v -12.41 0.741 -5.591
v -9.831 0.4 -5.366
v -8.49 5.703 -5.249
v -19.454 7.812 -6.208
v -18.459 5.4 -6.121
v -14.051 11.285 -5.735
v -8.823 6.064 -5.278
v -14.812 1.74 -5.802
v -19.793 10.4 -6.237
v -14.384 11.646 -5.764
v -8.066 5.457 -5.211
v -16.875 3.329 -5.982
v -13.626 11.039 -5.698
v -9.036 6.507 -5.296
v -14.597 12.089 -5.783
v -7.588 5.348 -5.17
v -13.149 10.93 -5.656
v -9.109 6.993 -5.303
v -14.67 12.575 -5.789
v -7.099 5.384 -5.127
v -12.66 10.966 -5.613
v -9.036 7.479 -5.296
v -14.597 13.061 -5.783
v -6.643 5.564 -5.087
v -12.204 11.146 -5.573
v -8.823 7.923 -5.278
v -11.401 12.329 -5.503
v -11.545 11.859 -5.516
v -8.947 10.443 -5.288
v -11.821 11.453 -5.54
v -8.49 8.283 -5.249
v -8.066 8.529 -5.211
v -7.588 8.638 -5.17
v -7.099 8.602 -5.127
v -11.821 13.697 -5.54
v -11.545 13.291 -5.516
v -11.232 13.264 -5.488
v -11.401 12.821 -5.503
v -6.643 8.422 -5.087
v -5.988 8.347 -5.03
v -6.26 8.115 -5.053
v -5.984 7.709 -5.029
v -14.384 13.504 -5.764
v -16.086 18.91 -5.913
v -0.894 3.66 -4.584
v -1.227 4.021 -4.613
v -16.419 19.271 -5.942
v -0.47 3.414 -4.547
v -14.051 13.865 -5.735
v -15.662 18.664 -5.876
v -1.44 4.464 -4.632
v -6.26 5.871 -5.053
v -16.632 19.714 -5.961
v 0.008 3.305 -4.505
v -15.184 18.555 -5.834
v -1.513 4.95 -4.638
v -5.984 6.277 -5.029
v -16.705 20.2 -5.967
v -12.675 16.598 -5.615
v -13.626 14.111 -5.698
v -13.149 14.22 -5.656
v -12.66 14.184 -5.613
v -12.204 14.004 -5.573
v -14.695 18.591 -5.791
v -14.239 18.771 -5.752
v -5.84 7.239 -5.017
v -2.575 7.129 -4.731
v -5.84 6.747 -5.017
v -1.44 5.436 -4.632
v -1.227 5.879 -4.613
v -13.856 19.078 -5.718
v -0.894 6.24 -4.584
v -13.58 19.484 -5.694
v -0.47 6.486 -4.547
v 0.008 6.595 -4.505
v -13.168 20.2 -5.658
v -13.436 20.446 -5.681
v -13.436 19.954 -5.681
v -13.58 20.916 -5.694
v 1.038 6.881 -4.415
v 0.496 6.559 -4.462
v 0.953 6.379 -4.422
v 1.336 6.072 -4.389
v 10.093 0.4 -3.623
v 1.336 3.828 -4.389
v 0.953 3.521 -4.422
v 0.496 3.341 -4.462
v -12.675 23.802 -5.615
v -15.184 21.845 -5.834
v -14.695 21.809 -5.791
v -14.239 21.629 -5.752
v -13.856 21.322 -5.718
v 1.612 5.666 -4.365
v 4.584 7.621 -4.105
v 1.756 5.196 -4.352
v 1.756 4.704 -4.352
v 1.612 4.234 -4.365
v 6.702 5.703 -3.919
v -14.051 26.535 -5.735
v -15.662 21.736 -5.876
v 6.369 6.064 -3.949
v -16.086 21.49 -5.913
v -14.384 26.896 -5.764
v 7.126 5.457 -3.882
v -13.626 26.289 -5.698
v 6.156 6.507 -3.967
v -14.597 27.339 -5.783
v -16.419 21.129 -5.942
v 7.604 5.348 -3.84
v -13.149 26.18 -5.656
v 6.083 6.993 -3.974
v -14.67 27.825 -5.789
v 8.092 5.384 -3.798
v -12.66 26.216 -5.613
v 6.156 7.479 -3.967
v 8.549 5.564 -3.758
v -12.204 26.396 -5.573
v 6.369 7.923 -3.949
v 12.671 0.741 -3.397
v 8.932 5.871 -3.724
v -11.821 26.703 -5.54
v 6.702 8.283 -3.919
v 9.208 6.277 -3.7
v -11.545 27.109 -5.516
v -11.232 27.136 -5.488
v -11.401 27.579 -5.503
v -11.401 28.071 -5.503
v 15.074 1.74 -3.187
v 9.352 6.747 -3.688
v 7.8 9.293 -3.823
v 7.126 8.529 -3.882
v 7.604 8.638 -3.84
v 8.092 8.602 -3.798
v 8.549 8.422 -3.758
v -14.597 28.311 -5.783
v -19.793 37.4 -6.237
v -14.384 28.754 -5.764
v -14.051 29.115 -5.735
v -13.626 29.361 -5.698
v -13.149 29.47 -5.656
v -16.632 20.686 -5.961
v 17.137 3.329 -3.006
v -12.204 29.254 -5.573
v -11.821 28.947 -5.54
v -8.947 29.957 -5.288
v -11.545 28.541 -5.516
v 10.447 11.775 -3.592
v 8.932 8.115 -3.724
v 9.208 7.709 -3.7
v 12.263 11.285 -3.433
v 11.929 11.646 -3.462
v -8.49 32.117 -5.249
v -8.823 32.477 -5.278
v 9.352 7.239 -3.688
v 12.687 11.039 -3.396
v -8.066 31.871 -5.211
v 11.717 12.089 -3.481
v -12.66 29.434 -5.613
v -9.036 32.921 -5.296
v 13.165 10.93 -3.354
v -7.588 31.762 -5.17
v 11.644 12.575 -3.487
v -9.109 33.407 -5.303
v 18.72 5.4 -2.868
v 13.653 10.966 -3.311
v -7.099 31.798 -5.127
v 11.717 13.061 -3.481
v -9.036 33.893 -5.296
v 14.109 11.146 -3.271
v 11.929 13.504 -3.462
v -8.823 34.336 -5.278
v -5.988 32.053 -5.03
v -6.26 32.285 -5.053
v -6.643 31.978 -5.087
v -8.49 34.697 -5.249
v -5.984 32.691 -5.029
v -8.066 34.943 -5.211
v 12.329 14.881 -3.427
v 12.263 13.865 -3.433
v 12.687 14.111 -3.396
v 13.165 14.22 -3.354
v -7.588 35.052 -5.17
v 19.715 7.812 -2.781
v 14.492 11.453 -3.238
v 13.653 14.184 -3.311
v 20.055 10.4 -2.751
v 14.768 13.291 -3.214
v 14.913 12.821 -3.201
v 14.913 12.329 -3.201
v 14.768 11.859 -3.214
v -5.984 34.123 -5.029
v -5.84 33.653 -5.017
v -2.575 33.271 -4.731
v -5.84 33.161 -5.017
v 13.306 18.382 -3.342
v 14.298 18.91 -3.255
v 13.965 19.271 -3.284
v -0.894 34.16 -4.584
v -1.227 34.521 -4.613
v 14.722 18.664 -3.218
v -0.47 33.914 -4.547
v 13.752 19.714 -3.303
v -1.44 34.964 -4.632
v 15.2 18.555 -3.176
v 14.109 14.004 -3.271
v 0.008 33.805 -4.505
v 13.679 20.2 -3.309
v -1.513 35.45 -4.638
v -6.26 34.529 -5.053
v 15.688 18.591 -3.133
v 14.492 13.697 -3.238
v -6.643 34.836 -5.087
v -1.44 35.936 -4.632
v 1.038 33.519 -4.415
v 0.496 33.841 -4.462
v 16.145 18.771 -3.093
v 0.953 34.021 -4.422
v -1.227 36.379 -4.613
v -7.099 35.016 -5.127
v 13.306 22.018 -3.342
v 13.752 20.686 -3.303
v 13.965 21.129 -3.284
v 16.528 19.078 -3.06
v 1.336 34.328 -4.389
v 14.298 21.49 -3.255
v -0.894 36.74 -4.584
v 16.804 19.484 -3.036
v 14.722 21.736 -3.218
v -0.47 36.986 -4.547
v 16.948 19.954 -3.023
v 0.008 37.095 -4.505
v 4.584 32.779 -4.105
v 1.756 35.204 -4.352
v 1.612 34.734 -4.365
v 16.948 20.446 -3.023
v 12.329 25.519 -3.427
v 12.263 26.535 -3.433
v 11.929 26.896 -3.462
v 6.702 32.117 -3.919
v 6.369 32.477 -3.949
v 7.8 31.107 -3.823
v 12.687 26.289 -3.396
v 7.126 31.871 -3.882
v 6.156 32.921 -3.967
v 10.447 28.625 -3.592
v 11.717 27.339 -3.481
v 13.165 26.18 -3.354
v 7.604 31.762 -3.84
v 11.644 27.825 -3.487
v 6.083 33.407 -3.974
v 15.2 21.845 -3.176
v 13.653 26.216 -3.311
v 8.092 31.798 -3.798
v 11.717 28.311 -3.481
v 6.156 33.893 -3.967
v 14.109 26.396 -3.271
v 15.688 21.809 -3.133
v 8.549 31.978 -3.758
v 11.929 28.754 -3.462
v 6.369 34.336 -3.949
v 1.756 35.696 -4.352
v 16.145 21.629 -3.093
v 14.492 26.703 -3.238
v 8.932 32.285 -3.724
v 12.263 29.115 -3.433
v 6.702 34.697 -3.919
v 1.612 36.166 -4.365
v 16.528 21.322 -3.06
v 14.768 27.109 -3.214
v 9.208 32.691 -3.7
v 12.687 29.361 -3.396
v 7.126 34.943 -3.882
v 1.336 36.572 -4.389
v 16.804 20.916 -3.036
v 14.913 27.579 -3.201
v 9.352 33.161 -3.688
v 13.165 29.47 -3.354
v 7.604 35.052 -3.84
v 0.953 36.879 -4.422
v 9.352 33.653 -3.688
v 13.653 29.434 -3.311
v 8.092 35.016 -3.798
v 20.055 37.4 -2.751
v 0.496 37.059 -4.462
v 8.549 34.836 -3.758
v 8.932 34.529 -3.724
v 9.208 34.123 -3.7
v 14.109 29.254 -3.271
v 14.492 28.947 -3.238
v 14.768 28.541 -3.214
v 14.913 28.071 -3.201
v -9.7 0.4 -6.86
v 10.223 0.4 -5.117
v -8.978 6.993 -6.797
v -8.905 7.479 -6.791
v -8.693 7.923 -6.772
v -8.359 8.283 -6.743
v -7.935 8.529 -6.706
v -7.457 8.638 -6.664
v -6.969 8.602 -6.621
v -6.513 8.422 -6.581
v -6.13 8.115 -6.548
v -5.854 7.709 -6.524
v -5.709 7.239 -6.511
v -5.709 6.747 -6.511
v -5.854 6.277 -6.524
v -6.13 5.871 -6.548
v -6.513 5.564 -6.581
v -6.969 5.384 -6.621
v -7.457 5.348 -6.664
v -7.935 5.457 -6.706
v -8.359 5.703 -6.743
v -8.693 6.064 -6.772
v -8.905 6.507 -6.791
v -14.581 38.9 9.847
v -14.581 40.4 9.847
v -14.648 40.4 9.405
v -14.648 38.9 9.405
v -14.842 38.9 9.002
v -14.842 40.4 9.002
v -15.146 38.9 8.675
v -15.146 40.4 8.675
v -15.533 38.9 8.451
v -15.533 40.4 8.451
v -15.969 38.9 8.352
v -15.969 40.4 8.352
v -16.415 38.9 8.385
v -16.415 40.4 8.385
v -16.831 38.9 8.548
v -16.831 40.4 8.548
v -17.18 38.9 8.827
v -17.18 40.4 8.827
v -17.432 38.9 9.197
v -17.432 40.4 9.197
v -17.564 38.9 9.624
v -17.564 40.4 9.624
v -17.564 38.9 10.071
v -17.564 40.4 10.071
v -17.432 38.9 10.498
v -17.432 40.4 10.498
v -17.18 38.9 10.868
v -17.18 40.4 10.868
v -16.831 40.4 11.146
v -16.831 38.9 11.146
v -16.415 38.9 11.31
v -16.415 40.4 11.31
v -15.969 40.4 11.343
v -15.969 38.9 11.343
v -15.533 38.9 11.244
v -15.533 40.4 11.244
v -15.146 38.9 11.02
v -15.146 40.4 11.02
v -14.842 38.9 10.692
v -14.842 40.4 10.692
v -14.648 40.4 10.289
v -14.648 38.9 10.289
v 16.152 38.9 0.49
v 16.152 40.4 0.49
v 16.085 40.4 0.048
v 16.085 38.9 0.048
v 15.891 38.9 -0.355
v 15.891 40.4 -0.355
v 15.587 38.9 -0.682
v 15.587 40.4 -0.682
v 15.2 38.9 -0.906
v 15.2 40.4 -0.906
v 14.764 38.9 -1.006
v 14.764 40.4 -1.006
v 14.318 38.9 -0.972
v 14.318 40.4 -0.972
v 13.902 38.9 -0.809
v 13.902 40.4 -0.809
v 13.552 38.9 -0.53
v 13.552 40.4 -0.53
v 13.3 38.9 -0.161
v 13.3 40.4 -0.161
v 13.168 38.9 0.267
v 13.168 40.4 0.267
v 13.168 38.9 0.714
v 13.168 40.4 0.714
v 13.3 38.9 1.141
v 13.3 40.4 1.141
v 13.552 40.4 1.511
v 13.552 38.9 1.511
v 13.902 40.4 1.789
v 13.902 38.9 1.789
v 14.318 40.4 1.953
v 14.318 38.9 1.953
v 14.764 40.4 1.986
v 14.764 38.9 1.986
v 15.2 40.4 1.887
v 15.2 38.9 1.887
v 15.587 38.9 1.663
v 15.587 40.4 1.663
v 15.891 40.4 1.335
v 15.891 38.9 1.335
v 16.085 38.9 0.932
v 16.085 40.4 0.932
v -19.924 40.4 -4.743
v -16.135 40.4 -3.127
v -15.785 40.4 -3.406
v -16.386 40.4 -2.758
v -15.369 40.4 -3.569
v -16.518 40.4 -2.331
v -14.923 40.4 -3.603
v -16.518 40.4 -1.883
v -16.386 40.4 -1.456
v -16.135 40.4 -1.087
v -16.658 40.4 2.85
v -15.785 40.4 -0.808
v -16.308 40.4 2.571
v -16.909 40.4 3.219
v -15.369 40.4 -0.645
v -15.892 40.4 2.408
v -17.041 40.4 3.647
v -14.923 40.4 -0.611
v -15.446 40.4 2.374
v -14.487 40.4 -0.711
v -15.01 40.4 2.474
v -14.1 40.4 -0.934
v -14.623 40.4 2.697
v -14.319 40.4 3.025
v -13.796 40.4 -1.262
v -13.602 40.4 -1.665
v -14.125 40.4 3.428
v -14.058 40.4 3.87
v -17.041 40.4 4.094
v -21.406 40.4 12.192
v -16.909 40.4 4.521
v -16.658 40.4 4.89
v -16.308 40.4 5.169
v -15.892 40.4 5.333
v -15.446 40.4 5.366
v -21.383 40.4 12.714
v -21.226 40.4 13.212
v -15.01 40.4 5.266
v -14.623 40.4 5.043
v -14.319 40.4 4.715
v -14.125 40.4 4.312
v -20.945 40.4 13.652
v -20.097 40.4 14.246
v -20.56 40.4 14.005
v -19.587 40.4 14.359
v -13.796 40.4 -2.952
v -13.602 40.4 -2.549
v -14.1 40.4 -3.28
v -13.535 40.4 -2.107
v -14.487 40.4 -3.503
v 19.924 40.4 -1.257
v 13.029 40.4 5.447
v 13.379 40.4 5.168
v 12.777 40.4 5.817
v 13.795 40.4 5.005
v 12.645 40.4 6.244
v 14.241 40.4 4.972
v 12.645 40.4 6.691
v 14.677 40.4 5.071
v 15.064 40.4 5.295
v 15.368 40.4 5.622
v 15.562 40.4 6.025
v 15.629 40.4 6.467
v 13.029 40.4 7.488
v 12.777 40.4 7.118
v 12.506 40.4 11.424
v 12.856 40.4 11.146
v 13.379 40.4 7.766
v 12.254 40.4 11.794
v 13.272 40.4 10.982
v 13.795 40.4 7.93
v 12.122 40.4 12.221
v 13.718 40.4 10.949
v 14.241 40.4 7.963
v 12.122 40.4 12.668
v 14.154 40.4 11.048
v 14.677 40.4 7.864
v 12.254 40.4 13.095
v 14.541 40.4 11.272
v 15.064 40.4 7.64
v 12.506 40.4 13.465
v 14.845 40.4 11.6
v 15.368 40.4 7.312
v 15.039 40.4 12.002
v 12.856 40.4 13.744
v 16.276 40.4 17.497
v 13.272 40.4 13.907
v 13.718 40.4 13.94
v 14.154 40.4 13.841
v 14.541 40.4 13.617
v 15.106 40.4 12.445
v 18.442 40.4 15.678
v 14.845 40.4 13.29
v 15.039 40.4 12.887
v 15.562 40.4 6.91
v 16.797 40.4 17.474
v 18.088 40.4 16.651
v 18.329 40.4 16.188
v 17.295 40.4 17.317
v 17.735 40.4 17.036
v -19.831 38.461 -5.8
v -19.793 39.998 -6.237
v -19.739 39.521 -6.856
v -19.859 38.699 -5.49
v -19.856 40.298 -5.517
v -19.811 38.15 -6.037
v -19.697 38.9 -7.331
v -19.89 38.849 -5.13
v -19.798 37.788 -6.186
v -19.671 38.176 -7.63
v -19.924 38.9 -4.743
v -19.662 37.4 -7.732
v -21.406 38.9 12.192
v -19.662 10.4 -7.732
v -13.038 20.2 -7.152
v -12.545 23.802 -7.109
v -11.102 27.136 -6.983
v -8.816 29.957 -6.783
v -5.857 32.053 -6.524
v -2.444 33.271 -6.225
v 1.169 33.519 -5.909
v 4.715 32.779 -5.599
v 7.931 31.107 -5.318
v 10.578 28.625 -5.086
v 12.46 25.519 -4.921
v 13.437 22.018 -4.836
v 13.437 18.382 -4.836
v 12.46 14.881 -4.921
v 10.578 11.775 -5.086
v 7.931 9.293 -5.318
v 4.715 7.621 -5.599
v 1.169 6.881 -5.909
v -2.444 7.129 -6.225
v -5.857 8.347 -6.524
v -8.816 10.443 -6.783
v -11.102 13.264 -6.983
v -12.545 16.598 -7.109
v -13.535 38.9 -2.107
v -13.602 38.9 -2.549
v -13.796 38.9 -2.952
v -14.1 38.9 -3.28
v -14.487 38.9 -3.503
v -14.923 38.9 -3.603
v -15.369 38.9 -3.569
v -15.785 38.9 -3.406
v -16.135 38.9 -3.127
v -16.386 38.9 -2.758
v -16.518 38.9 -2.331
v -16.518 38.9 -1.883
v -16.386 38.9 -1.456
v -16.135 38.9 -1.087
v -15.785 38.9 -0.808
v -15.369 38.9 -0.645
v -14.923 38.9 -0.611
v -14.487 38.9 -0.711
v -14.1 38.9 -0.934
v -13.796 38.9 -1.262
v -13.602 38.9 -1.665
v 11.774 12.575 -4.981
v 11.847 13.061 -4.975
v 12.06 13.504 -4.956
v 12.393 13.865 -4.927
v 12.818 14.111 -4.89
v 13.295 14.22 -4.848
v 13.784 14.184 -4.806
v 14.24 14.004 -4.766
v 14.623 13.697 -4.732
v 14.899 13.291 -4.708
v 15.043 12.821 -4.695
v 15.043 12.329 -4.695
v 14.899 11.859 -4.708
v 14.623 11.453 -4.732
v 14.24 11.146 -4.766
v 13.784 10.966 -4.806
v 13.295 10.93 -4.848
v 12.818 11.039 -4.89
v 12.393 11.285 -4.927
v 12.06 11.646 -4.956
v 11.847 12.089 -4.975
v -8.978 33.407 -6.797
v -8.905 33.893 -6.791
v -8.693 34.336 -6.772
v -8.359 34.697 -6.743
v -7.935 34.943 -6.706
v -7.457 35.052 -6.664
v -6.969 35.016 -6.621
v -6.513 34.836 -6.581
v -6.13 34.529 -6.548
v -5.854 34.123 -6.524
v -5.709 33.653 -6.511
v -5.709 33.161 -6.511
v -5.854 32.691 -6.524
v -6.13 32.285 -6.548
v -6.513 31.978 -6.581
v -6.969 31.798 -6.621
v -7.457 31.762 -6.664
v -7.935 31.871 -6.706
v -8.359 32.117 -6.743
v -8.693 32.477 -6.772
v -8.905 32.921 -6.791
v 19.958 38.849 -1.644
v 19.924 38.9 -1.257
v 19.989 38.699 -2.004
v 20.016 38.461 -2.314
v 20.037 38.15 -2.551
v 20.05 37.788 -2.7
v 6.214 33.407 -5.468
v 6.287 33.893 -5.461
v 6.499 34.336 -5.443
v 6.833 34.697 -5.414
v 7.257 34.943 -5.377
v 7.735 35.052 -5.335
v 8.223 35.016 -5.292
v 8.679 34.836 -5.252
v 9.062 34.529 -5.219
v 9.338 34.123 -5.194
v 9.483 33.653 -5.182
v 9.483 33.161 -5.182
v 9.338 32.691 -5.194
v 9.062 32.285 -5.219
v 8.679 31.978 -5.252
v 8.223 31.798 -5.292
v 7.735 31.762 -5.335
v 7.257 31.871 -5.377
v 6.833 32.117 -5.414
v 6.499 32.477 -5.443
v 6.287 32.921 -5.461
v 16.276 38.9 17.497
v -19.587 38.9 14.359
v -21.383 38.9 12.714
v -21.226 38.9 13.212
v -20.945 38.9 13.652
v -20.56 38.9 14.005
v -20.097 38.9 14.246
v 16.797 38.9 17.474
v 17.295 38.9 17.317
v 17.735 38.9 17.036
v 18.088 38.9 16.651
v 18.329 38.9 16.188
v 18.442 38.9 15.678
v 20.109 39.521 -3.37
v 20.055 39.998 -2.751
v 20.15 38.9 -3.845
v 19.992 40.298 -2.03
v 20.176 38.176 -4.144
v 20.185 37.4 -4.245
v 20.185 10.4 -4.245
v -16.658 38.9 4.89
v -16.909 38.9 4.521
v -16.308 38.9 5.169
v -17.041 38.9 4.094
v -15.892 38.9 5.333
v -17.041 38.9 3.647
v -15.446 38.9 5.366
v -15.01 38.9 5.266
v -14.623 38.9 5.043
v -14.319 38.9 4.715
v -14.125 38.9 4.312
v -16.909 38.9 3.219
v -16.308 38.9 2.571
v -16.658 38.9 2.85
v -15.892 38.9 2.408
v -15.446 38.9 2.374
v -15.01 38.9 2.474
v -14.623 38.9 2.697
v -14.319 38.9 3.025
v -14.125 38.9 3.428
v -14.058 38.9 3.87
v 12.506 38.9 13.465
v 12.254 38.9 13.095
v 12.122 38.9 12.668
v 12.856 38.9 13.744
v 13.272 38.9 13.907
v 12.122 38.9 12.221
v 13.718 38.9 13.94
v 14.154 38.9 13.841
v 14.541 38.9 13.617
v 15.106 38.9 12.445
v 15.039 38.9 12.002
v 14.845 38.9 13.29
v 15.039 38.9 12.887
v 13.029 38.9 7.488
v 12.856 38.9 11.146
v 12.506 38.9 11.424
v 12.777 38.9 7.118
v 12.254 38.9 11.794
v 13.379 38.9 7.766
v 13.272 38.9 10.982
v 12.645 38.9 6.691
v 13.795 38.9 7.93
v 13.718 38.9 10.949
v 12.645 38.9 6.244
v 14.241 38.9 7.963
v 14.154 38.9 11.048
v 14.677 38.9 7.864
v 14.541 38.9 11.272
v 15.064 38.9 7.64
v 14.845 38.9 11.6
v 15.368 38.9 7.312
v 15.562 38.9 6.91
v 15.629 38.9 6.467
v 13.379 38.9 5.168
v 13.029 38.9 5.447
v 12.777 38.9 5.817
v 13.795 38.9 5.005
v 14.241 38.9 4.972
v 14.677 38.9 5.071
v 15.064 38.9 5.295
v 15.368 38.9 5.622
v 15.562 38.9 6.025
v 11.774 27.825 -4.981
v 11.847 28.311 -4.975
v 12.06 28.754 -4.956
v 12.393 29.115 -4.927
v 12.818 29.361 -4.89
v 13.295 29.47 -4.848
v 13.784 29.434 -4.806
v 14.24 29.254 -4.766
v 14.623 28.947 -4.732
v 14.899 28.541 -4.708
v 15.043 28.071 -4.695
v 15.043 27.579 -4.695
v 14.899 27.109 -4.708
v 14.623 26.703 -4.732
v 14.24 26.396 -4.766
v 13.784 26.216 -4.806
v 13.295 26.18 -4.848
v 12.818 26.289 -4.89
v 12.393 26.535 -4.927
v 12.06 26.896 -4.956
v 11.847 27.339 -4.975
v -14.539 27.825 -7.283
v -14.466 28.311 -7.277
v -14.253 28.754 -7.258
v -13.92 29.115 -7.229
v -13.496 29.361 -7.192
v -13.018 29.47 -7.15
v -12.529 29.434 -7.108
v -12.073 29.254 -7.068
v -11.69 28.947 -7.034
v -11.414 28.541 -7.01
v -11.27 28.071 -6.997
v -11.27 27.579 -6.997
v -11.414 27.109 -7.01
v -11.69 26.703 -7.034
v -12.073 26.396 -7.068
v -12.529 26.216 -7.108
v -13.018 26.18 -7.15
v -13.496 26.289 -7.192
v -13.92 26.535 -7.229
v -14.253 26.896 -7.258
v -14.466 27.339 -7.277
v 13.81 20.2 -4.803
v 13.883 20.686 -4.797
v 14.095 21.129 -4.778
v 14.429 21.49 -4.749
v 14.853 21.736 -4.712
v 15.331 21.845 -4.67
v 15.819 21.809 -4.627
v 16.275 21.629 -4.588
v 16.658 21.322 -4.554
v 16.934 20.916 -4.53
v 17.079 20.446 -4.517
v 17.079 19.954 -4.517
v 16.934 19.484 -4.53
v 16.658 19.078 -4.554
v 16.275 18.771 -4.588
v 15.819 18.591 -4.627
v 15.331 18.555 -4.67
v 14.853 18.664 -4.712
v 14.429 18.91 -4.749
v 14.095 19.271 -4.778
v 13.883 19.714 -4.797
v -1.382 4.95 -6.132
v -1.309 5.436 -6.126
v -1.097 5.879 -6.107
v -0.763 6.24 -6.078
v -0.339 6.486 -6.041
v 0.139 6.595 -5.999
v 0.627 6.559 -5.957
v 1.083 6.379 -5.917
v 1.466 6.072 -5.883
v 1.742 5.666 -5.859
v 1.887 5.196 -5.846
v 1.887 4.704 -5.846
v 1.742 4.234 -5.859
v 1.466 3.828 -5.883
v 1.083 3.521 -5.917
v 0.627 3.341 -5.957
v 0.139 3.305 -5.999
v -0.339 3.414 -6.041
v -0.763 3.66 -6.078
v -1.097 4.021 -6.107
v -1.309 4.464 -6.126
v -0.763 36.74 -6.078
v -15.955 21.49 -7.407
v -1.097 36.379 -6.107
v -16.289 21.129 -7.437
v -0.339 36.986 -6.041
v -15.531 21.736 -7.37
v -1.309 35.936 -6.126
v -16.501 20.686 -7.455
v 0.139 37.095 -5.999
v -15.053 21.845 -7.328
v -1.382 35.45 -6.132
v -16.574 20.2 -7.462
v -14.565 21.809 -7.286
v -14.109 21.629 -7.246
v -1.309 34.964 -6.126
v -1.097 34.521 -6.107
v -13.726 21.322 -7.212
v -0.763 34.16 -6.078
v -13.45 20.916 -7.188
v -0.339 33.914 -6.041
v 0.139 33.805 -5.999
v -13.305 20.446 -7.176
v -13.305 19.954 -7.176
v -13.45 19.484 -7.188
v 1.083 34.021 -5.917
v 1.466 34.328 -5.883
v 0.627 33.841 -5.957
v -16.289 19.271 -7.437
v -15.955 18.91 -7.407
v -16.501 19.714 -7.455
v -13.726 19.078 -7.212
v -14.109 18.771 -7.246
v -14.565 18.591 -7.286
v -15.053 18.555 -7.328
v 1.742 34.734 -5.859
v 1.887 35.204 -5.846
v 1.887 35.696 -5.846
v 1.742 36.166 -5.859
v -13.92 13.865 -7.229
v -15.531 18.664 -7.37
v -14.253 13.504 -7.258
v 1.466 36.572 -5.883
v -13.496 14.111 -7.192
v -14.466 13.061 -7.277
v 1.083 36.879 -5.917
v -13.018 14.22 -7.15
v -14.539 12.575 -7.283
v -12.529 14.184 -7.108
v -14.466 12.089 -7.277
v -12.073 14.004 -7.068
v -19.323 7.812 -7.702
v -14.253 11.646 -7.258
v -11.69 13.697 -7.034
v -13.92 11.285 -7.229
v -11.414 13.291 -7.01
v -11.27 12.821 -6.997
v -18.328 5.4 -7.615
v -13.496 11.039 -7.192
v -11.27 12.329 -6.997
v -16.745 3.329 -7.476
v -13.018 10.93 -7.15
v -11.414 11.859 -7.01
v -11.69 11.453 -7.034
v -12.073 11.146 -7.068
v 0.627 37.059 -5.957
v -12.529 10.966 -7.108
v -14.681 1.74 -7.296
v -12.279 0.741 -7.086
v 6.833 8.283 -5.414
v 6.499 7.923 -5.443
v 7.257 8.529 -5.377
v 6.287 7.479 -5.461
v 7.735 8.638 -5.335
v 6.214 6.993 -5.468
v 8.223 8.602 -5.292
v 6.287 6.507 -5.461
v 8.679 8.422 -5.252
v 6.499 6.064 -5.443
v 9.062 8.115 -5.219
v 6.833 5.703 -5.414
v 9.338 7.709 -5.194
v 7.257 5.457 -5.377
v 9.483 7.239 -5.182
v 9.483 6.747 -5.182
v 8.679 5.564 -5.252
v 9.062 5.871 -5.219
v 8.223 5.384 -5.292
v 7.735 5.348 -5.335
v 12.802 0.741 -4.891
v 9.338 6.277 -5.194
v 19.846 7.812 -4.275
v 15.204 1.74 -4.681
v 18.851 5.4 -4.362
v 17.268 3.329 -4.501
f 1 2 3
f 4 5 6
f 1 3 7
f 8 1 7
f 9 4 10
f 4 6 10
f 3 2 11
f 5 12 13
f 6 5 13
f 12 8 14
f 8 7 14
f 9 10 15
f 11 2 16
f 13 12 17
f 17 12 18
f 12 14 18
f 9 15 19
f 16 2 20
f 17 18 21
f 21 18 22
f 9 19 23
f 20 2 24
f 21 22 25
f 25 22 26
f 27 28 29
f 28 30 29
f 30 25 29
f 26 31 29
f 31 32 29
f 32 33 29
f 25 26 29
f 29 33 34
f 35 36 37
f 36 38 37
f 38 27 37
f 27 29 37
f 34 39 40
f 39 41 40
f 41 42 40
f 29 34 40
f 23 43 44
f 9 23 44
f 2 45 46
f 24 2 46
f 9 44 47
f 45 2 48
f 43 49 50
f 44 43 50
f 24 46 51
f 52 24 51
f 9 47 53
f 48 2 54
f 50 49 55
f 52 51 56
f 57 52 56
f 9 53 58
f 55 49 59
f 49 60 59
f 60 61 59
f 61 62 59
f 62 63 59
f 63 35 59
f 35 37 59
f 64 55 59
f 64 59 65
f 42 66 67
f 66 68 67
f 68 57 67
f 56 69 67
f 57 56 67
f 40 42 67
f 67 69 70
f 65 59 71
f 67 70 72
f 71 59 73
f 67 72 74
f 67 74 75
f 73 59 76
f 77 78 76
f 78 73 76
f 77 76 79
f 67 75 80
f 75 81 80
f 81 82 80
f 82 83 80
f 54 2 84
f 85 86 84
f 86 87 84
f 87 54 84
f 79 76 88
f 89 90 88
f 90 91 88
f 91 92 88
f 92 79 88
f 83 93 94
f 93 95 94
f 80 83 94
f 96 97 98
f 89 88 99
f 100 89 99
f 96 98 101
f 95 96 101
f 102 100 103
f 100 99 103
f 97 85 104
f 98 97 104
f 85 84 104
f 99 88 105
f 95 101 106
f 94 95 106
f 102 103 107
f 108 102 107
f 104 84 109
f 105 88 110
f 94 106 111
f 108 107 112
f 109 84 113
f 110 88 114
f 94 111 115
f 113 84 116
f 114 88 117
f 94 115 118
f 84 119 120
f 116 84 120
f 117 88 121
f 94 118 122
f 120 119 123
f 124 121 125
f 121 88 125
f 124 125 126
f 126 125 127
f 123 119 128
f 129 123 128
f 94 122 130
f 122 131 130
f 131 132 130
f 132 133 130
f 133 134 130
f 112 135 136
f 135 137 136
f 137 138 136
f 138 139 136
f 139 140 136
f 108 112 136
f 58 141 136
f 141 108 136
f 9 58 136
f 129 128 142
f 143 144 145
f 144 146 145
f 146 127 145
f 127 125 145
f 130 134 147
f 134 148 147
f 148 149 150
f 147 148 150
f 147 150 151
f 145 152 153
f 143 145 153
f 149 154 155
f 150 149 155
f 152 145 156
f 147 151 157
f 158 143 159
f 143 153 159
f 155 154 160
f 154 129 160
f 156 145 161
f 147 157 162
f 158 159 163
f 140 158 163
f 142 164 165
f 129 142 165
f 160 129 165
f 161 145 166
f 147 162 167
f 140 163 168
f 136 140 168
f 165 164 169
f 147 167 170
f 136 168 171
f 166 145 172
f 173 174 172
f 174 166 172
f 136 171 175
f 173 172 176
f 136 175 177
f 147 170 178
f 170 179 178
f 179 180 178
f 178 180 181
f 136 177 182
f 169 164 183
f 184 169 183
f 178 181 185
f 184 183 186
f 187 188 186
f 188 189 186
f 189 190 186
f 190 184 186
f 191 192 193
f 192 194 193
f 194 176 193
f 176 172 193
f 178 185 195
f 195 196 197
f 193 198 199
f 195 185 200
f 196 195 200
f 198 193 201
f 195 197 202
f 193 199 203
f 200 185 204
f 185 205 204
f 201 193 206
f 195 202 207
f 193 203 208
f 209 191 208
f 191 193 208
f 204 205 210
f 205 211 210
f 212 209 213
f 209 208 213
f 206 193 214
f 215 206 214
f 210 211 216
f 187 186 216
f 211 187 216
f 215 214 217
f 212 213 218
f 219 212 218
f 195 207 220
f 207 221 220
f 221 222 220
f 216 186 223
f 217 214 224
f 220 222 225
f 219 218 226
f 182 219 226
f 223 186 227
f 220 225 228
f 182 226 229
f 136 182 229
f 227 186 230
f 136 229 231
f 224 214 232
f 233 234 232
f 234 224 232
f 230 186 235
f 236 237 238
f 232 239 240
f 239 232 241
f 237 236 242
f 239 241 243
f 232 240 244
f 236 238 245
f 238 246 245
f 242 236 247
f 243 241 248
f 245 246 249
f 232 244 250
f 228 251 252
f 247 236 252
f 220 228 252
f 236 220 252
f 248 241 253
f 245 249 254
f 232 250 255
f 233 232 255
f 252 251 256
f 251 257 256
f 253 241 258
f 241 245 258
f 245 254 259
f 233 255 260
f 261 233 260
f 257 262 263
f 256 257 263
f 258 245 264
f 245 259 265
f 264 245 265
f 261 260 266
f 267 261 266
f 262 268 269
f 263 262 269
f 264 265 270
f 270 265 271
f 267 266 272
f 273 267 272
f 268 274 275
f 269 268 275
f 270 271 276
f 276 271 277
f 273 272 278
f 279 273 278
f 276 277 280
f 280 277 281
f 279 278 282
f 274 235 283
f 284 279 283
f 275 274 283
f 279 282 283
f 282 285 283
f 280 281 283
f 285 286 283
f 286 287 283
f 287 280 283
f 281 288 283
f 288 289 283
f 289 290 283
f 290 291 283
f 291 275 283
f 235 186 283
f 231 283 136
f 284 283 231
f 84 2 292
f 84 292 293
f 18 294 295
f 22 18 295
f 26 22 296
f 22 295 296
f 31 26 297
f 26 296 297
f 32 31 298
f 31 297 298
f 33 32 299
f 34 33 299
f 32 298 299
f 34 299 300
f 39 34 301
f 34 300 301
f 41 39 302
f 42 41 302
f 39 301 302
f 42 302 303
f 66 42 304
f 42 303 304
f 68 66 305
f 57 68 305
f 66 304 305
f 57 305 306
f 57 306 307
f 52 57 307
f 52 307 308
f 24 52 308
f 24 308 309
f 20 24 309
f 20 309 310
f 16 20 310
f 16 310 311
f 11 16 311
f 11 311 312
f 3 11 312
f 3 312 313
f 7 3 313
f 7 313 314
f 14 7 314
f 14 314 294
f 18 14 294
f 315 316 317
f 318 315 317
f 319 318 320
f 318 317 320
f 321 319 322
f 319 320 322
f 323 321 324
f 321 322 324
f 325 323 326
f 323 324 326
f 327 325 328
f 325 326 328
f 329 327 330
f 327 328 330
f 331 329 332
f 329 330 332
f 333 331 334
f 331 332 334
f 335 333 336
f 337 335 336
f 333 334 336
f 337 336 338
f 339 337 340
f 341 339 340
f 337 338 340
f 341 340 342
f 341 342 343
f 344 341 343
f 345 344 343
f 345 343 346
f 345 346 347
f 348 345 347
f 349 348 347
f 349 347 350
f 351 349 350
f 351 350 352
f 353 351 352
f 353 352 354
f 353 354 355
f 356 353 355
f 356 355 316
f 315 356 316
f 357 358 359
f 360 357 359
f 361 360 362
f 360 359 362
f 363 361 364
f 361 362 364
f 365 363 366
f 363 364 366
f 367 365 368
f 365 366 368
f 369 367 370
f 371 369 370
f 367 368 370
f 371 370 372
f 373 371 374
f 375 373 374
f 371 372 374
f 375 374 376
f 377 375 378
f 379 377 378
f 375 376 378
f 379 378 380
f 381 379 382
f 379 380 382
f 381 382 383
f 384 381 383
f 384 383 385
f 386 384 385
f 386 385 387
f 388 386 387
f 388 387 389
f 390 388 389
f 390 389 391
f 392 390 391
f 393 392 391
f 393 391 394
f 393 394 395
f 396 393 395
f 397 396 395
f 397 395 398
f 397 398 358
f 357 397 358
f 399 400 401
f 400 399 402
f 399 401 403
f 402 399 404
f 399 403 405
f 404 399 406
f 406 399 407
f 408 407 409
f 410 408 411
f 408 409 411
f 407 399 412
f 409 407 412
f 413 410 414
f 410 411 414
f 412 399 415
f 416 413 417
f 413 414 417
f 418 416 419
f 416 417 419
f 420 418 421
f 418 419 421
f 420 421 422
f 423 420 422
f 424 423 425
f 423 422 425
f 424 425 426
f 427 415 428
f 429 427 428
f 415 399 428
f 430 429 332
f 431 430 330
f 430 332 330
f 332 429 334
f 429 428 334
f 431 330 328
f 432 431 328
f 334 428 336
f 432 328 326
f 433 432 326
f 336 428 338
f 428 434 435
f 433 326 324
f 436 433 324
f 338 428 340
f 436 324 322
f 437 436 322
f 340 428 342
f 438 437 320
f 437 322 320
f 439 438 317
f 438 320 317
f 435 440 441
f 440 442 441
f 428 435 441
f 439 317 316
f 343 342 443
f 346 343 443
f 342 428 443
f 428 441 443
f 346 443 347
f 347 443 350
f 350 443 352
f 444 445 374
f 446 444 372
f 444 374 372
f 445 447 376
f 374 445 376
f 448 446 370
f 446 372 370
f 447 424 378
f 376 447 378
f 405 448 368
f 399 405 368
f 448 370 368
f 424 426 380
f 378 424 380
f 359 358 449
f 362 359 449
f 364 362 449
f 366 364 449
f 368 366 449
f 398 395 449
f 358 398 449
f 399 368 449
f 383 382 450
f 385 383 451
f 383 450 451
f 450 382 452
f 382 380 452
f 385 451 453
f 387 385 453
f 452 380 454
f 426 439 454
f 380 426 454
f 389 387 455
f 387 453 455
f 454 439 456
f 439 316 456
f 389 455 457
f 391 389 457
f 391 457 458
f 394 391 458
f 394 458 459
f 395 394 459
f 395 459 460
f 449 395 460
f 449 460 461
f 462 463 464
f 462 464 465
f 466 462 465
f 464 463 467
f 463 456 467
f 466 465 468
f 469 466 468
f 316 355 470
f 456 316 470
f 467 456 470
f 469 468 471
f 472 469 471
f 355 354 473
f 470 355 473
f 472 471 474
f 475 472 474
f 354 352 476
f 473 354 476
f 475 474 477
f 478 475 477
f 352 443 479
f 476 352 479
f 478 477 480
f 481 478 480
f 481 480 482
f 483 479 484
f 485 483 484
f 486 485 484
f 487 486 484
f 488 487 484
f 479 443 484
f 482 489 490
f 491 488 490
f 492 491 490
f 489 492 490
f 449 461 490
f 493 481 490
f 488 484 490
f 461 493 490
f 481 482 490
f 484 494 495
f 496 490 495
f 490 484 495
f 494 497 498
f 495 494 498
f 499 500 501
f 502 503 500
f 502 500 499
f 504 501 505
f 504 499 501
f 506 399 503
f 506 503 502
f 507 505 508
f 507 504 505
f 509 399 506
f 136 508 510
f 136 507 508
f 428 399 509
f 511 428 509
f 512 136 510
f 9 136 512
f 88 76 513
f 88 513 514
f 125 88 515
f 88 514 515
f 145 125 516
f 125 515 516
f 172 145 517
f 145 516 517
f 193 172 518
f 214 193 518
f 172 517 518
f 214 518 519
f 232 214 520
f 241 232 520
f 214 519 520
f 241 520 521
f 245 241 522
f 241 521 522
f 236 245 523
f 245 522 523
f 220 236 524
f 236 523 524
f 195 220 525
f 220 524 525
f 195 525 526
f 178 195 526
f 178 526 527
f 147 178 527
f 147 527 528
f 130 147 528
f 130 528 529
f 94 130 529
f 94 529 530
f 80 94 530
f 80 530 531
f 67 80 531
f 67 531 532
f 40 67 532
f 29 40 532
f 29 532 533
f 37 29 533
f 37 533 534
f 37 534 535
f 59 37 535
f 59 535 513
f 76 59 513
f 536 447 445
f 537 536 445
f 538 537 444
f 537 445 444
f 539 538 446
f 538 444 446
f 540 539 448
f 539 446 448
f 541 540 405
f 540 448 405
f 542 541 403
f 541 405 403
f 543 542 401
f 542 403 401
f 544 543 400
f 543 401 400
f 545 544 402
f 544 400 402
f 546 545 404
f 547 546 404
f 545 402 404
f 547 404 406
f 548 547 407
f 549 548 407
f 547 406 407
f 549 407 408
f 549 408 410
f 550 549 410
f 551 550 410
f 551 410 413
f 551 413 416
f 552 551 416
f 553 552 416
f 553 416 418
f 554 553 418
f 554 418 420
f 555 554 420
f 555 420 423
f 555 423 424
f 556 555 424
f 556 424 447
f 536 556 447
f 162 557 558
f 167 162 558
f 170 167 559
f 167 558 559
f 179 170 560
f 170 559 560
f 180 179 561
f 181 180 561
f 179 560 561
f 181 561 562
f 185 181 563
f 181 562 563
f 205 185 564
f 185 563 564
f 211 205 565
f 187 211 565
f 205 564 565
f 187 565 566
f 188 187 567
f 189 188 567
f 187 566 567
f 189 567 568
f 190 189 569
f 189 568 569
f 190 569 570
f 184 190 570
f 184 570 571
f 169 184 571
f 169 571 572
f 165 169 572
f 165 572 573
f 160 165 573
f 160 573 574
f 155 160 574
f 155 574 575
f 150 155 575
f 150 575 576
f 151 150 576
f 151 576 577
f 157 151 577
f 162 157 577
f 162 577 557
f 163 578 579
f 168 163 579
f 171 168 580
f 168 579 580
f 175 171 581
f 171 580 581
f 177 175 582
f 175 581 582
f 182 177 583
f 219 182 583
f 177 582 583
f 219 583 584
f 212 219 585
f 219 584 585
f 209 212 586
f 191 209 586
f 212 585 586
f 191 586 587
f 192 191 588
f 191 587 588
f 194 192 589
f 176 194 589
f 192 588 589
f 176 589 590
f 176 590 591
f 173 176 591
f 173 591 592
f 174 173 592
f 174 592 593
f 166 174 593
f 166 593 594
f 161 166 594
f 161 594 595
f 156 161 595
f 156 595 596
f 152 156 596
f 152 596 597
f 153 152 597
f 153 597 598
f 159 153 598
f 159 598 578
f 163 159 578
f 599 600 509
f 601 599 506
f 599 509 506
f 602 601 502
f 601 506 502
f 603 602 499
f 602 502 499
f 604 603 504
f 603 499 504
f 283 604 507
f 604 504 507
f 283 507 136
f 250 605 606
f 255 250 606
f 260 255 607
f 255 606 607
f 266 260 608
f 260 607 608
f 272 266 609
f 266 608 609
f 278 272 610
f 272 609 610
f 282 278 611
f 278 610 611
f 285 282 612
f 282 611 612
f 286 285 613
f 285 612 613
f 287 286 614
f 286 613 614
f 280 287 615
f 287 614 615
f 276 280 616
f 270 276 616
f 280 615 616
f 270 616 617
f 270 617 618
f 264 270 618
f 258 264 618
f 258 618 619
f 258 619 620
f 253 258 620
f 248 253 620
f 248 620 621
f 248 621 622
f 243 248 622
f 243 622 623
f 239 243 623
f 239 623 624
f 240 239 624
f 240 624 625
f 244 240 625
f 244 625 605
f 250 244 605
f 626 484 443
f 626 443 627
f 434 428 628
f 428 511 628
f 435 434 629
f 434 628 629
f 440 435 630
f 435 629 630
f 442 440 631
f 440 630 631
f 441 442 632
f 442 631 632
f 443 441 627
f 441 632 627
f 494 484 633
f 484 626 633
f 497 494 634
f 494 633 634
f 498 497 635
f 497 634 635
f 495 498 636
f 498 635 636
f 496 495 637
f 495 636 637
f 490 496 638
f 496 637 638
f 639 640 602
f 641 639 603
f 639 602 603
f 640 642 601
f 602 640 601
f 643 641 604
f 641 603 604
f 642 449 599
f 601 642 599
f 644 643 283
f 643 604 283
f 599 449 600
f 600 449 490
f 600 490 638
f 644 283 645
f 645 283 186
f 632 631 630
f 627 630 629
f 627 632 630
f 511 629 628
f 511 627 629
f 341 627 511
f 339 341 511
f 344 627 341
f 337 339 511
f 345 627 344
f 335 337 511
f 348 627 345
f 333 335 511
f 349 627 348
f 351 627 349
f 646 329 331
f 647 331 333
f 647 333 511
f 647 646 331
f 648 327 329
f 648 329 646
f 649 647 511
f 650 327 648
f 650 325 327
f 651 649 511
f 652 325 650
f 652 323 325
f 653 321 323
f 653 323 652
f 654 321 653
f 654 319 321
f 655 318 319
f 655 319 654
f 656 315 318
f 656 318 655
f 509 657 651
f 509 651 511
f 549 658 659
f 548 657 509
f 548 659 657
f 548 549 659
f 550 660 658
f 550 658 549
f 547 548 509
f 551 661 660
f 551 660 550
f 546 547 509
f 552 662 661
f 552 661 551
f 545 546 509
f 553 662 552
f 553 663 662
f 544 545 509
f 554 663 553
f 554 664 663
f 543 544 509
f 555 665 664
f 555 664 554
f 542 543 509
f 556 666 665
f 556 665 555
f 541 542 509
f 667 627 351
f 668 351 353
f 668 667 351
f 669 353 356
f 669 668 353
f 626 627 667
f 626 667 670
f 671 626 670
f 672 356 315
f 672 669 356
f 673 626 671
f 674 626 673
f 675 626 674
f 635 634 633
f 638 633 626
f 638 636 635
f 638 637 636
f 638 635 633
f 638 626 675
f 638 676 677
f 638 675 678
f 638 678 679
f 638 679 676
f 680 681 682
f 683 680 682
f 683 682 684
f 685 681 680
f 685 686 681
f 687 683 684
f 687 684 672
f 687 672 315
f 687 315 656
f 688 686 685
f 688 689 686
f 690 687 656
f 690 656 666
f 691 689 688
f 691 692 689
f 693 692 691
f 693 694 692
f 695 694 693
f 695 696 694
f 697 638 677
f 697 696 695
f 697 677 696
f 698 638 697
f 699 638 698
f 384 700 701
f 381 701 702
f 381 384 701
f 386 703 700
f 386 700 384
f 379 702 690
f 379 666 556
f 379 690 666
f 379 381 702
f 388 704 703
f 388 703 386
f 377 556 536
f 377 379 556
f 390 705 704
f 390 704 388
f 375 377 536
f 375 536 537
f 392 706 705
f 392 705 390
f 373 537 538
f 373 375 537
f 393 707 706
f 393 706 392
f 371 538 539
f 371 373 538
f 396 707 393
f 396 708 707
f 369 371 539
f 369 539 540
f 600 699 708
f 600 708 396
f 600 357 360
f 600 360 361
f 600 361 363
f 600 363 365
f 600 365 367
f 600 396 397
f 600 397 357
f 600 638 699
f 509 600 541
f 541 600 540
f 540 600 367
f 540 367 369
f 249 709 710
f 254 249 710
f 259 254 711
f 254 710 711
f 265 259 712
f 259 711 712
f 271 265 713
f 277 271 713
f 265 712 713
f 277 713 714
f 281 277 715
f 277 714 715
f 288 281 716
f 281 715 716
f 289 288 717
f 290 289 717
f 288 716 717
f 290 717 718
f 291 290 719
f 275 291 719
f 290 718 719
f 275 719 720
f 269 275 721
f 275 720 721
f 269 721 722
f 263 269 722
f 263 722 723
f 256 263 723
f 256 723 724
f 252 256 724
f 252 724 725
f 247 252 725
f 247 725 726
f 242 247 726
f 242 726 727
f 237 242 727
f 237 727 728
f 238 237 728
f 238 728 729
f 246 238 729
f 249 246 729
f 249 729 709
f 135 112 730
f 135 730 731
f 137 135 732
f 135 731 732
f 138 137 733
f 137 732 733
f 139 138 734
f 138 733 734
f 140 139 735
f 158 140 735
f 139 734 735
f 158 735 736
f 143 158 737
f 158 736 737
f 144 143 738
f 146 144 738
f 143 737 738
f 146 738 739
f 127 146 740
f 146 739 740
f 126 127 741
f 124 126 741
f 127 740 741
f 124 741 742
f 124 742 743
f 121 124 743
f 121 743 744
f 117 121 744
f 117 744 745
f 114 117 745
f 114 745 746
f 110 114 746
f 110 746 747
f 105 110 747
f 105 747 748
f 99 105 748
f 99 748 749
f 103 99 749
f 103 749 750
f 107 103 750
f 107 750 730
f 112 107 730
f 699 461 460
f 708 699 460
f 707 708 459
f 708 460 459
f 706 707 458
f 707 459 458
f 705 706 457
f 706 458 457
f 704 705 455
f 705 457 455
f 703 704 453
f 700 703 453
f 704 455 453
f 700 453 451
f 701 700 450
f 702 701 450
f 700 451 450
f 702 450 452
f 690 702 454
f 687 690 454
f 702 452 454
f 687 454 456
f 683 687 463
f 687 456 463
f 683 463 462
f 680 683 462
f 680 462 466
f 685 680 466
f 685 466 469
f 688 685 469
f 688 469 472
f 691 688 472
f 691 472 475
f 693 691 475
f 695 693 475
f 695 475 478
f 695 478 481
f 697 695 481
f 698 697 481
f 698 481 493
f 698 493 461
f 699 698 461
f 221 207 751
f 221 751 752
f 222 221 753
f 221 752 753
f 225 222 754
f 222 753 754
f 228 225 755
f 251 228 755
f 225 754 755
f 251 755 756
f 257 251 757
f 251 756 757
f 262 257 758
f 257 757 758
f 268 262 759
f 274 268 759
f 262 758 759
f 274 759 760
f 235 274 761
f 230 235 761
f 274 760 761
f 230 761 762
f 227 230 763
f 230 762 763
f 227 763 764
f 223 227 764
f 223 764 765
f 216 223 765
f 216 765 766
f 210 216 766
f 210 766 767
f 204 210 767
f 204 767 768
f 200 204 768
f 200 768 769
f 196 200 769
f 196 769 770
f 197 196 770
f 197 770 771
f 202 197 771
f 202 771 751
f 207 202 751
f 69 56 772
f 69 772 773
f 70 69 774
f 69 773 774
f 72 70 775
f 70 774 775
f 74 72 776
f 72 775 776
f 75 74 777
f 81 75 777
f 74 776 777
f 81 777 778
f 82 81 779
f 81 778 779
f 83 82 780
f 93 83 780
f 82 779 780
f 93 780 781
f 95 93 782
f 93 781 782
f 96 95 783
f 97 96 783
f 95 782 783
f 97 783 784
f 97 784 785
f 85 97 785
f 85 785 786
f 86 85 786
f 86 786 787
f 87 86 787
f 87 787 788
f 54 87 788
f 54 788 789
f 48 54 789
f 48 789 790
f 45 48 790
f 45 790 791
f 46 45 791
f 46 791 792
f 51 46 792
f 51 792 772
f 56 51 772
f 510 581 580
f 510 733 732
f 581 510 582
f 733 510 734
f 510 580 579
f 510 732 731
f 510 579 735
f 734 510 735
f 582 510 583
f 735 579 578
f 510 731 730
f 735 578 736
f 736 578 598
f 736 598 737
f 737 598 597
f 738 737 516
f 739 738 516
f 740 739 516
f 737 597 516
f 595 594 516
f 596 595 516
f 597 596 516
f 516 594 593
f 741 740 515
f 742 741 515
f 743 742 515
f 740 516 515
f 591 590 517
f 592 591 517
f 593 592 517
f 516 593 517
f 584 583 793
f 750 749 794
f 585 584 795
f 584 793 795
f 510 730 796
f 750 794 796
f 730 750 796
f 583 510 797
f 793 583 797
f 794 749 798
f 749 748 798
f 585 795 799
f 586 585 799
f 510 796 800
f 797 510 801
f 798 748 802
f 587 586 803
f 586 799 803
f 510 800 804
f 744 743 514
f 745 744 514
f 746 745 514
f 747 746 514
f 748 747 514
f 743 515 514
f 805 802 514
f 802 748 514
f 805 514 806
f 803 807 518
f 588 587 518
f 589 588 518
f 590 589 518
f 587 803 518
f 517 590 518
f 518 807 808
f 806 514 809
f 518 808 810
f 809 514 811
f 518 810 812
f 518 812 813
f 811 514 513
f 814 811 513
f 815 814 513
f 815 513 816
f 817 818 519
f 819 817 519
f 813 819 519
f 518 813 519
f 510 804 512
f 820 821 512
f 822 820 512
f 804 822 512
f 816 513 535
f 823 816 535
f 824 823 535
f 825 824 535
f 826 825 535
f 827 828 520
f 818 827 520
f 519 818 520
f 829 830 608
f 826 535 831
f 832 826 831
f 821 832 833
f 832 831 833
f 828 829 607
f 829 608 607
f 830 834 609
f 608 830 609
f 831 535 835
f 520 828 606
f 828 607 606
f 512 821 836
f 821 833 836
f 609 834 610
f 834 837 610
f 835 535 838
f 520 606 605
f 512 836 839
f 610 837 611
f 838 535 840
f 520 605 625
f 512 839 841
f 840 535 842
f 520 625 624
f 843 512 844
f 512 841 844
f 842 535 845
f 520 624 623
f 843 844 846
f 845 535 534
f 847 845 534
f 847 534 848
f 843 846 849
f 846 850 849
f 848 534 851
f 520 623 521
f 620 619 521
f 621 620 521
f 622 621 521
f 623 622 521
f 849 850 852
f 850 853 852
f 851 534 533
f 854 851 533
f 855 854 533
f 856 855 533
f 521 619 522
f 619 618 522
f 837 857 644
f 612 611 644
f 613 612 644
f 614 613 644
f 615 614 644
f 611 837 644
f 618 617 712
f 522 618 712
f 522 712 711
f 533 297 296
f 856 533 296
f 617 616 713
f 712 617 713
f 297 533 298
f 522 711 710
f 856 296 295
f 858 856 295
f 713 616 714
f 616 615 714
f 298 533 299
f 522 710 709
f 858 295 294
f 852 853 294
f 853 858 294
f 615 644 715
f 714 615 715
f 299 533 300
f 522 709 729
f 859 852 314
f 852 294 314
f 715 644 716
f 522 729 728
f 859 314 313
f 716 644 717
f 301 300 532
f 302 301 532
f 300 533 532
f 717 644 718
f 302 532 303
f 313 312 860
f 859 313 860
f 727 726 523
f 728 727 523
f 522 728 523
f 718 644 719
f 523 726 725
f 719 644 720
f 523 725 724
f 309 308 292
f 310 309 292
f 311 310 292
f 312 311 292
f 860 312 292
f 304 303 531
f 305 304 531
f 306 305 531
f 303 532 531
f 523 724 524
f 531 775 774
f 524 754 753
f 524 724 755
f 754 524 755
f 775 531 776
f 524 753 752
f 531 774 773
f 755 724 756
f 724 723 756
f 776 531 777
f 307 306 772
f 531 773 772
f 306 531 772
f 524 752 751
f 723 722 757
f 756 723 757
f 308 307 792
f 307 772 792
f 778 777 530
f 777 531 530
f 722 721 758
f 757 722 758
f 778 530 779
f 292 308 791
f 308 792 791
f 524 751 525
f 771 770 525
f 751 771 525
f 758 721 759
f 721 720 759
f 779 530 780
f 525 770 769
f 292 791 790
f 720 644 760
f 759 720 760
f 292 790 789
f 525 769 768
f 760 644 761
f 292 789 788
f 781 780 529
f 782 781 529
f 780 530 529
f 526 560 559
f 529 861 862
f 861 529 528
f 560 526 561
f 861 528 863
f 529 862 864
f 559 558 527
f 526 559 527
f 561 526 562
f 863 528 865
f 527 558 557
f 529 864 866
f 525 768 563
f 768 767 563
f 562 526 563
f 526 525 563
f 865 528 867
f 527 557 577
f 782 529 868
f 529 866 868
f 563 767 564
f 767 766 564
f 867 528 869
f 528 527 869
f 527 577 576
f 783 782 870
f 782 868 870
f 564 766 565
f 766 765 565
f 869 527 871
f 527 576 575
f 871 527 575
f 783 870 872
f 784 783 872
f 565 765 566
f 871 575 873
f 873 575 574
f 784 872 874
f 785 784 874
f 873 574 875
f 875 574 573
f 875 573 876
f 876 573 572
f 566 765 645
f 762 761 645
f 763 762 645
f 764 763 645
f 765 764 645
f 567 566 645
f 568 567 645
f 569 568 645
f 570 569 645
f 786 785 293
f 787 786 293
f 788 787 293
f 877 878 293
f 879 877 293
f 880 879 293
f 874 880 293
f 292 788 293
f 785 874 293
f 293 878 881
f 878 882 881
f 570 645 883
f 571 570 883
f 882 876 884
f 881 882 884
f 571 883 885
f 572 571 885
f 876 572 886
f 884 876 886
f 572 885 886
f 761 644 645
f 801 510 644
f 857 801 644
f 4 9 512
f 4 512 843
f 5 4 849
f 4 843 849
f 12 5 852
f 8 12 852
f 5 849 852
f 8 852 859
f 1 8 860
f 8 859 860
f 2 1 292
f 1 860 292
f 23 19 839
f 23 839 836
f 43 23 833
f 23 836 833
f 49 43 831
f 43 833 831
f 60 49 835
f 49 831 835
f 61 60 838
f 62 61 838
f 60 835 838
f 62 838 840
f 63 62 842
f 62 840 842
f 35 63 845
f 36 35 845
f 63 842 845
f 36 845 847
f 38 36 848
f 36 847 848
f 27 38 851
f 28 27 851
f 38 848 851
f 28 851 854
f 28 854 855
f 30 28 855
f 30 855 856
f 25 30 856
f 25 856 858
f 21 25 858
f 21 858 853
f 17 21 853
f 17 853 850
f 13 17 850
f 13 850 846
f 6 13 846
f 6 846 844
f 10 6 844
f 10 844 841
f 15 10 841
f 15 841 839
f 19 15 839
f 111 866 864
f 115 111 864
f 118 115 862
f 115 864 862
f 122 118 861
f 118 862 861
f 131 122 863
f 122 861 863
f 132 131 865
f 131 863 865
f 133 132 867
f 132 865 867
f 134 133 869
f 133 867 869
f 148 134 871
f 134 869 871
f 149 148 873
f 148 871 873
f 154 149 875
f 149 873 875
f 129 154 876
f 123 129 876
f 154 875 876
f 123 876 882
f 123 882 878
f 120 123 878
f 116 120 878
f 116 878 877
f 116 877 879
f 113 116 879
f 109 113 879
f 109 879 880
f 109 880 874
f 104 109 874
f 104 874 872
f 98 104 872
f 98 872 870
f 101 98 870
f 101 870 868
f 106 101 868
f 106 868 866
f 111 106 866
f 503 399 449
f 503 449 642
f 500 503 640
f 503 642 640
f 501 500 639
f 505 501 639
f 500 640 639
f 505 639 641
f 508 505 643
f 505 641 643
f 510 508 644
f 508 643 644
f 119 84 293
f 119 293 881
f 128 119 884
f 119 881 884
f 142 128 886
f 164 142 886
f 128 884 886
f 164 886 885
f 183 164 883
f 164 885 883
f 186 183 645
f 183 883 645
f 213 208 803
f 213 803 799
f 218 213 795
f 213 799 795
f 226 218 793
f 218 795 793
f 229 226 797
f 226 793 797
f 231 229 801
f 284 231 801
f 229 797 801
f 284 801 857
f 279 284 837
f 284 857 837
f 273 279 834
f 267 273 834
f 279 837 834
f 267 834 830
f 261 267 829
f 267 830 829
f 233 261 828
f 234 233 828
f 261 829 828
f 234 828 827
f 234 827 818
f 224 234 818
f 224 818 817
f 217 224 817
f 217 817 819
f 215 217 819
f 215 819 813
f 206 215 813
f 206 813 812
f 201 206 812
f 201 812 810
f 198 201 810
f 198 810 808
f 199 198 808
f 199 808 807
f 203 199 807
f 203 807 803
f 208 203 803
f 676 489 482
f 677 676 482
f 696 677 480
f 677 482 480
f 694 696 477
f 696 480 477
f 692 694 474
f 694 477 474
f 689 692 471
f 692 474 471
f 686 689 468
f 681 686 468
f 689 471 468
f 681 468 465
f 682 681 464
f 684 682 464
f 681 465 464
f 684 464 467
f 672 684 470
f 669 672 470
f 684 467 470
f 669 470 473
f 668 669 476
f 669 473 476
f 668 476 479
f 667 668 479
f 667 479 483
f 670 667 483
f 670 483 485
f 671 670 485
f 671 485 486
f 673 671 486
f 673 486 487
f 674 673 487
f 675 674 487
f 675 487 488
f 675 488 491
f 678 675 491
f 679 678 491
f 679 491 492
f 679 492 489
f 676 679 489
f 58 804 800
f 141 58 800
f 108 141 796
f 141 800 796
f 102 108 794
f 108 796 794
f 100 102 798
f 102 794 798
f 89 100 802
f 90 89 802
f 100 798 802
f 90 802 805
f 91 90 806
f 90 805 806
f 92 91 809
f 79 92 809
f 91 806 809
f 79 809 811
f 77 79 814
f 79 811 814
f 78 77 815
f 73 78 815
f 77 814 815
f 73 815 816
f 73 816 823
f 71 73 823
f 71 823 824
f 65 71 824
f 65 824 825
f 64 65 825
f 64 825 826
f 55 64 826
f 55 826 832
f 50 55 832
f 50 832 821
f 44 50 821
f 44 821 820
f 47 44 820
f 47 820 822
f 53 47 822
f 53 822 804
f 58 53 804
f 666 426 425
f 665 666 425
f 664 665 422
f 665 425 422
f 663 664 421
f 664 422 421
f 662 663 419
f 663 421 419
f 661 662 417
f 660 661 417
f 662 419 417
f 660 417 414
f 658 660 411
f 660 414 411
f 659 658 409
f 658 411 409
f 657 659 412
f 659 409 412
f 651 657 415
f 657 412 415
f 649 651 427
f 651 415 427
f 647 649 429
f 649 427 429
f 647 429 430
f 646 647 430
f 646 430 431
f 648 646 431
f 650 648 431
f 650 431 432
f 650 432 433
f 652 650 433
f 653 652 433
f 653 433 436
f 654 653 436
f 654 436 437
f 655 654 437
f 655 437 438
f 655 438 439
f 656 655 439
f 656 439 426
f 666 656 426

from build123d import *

# Parameters (mm, degrees)
SKETCH1_W                      = 40
SKETCH1_H                      = 40
BOSS_EXTRUDE1_DEPTH            = 22
SKETCH2_W                      = 20.5
SKETCH2_H                      = 38.5
CUT_EXTRUDE1_DEPTH             = 60.896458739
M24_CLEARANCE_HOLE1_D          = 26.7
M24_CLEARANCE_HOLE1_DEPTH      = 4.972963553
F_3_3_3_3_DIAMETER_HOLE1_D     = 3.3
F_3_3_3_3_DIAMETER_HOLE1_DEPTH = 4.972963553
F_3_0_3_DIAMETER_HOLE1_D       = 3
FILLET1_R                      = 1.5
FILLET2_R                      = 2
FILLET3_R                      = 3
FILLET4_R                      = 10


with BuildPart() as part:
    # Sketch1 → Boss-Extrude1 (new body)
    with BuildSketch(Plane(origin=(-1.395486846, 0, 15.950487634), x_dir=(0, -1, 0), z_dir=(-0.08715574274765787, 0, 0.9961946980917457))):
        with Locations((-20.4, -0.261467228)):
            Rectangle(SKETCH1_W, SKETCH1_H)
    extrude(amount=-BOSS_EXTRUDE1_DEPTH)

    # Sketch2 → Cut-Extrude1 (cut, through all)
    with BuildSketch(Plane(origin=(19.663421695, 0, 1.720326484), x_dir=(0.08715574274765787, 0, -0.9961946980917455), z_dir=(0.9961946980917455, 3.832107347333544e-15, 0.08715574274765787))):
        with Locations((-5.761415906, 19.65)):
            Rectangle(SKETCH2_W, SKETCH2_H)
    extrude(amount=-CUT_EXTRUDE1_DEPTH, mode=Mode.SUBTRACT)

    # M24 Clearance Hole1
    with Locations(Plane(origin=(0.391205881, 0, -4.471503677), x_dir=(0.9961946980917455, 0, 0.08715574274765787), z_dir=(-0.08715574274765787, 0, 0.9961946980917455))):
        with Locations((-0.261467228, 20.2)):
            Hole(M24_CLEARANCE_HOLE1_D / 2, depth=M24_CLEARANCE_HOLE1_DEPTH)

    # Ø3.3 (3.3) Diameter Hole1
    with Locations(Plane(origin=(0.391205881, 0, -4.471503677), x_dir=(0.9961946980917455, 0, 0.08715574274765787), z_dir=(-0.08715574274765787, 0, 0.9961946980917455))):
        with Locations((-0.261467228, 4.95), (-7.886467228, 6.993112592), (-13.468354636, 12.575), (-15.511467228, 20.2), (-13.468354636, 27.825), (-7.886467228, 33.406887408), (-0.261467228, 35.45), (7.363532772, 33.406887408), (12.945420179, 27.825), (14.988532772, 20.2), (12.945420179, 12.575), (7.363532772, 6.993112592)):
            Hole(F_3_3_3_3_DIAMETER_HOLE1_D / 2, depth=F_3_3_3_3_DIAMETER_HOLE1_DEPTH)

    # Ø3.0 (3) Diameter Hole1 (through all)
    with Locations(Plane(origin=(0, 38.9, 0), x_dir=(-1, 0, 0), z_dir=(0, -1, 0))):
        with Locations((-14.651558368, -0.490248903), (-14.128623911, -6.467417091), (-13.605689455, -12.44458528), (15.035043636, 2.106992231), (15.557978092, -3.870175957), (16.080912549, -9.847344146)):
            Hole(F_3_0_3_DIAMETER_HOLE1_D / 2)

    # Fillet1
    fillet1_edges = [part.edges().sort_by_distance(p)[0] for p in [
        (0.130733614, 38.9, -4.494292047),
    ]]
    fillet(fillet1_edges, radius=FILLET1_R)

    # Fillet2
    fillet2_edges = [part.edges().sort_by_distance(p)[0] for p in [
        (18.26793485, 39.65, 17.670814119),
        (-21.579853074, 39.65, 14.184584409),
    ]]
    fillet(fillet2_edges, radius=FILLET2_R)

    # Fillet3
    fillet3_edges = [part.edges().sort_by_distance(p)[0] for p in [
        (0.261467228, 40.4, -5.988584094),
    ]]
    fillet(fillet3_edges, radius=FILLET3_R)

    # Fillet4
    fillet4_edges = [part.edges().sort_by_distance(p)[0] for p in [
        (20.119994383, 0.4, -3.498323216),
        (-19.727793541, 0.4, -6.984552926),
    ]]
    fillet(fillet4_edges, radius=FILLET4_R)


solid = part.part
